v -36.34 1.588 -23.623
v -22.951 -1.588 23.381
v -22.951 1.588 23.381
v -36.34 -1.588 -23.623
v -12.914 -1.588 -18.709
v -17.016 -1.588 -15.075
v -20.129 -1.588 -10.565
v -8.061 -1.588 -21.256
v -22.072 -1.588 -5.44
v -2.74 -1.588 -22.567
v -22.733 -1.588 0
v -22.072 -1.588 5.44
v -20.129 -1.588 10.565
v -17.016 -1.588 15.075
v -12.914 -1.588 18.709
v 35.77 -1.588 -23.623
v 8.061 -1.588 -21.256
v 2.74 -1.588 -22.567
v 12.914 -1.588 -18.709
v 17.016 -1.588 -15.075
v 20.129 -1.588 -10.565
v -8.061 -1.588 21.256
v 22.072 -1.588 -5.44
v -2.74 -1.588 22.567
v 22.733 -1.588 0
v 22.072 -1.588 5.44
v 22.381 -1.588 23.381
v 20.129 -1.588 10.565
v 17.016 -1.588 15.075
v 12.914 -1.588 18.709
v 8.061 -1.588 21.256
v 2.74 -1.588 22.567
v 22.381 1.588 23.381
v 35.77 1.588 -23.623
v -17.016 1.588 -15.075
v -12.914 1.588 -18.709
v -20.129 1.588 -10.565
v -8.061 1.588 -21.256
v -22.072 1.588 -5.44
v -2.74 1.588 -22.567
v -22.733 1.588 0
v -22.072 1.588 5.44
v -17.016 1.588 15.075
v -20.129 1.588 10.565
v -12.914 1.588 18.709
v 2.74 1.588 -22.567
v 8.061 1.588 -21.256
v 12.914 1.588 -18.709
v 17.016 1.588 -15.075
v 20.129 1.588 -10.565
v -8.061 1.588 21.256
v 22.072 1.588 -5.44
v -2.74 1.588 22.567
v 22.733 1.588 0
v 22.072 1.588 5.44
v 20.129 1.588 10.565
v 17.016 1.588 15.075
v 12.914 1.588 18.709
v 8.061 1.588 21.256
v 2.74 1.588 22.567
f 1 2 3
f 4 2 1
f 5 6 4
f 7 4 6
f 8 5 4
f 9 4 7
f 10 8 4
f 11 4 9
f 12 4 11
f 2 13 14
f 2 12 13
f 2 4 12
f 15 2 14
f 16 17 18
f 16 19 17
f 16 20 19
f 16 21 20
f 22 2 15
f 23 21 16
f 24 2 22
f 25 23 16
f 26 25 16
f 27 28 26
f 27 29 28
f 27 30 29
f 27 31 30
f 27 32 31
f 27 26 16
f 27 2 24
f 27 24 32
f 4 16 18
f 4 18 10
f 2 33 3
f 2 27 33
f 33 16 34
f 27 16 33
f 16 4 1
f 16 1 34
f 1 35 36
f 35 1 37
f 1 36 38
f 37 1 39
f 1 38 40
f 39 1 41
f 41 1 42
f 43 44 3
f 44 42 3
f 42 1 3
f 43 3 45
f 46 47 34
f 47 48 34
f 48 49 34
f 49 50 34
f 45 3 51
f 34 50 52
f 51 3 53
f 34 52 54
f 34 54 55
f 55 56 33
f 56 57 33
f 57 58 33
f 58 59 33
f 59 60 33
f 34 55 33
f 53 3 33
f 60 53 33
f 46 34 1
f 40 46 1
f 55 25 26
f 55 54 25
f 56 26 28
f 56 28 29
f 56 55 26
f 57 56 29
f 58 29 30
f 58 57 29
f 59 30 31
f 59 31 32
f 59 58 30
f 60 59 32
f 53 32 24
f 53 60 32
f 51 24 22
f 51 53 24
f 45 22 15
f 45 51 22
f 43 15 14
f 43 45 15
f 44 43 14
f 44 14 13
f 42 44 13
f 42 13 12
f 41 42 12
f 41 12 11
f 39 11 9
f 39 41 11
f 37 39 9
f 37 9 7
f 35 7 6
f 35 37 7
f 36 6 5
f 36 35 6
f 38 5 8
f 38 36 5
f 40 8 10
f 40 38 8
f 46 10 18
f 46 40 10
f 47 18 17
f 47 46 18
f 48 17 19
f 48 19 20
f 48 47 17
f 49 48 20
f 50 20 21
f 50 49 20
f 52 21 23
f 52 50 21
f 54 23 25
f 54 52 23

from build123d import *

# Parameters (mm, degrees)
F0_R     = 22.733
F1_DEPTH = 1.5875


# Not quite as in the source:
# - a feature names something its author has since deleted; it is built from what else it names


with BuildPart() as f1:
    # F0 (on Front) → F1 (new body, symmetric)
    with BuildSketch(Plane.XZ):
        Polygon((22.3805892097, 23.3813975786), (-22.9507907903, 23.3813975786), (-36.3404007903, -23.6231935325), (35.7701992097, -23.6231935325), align=None)
        Circle(F0_R, mode=Mode.SUBTRACT)
    extrude(amount=F1_DEPTH, both=True)


solid = f1.part
